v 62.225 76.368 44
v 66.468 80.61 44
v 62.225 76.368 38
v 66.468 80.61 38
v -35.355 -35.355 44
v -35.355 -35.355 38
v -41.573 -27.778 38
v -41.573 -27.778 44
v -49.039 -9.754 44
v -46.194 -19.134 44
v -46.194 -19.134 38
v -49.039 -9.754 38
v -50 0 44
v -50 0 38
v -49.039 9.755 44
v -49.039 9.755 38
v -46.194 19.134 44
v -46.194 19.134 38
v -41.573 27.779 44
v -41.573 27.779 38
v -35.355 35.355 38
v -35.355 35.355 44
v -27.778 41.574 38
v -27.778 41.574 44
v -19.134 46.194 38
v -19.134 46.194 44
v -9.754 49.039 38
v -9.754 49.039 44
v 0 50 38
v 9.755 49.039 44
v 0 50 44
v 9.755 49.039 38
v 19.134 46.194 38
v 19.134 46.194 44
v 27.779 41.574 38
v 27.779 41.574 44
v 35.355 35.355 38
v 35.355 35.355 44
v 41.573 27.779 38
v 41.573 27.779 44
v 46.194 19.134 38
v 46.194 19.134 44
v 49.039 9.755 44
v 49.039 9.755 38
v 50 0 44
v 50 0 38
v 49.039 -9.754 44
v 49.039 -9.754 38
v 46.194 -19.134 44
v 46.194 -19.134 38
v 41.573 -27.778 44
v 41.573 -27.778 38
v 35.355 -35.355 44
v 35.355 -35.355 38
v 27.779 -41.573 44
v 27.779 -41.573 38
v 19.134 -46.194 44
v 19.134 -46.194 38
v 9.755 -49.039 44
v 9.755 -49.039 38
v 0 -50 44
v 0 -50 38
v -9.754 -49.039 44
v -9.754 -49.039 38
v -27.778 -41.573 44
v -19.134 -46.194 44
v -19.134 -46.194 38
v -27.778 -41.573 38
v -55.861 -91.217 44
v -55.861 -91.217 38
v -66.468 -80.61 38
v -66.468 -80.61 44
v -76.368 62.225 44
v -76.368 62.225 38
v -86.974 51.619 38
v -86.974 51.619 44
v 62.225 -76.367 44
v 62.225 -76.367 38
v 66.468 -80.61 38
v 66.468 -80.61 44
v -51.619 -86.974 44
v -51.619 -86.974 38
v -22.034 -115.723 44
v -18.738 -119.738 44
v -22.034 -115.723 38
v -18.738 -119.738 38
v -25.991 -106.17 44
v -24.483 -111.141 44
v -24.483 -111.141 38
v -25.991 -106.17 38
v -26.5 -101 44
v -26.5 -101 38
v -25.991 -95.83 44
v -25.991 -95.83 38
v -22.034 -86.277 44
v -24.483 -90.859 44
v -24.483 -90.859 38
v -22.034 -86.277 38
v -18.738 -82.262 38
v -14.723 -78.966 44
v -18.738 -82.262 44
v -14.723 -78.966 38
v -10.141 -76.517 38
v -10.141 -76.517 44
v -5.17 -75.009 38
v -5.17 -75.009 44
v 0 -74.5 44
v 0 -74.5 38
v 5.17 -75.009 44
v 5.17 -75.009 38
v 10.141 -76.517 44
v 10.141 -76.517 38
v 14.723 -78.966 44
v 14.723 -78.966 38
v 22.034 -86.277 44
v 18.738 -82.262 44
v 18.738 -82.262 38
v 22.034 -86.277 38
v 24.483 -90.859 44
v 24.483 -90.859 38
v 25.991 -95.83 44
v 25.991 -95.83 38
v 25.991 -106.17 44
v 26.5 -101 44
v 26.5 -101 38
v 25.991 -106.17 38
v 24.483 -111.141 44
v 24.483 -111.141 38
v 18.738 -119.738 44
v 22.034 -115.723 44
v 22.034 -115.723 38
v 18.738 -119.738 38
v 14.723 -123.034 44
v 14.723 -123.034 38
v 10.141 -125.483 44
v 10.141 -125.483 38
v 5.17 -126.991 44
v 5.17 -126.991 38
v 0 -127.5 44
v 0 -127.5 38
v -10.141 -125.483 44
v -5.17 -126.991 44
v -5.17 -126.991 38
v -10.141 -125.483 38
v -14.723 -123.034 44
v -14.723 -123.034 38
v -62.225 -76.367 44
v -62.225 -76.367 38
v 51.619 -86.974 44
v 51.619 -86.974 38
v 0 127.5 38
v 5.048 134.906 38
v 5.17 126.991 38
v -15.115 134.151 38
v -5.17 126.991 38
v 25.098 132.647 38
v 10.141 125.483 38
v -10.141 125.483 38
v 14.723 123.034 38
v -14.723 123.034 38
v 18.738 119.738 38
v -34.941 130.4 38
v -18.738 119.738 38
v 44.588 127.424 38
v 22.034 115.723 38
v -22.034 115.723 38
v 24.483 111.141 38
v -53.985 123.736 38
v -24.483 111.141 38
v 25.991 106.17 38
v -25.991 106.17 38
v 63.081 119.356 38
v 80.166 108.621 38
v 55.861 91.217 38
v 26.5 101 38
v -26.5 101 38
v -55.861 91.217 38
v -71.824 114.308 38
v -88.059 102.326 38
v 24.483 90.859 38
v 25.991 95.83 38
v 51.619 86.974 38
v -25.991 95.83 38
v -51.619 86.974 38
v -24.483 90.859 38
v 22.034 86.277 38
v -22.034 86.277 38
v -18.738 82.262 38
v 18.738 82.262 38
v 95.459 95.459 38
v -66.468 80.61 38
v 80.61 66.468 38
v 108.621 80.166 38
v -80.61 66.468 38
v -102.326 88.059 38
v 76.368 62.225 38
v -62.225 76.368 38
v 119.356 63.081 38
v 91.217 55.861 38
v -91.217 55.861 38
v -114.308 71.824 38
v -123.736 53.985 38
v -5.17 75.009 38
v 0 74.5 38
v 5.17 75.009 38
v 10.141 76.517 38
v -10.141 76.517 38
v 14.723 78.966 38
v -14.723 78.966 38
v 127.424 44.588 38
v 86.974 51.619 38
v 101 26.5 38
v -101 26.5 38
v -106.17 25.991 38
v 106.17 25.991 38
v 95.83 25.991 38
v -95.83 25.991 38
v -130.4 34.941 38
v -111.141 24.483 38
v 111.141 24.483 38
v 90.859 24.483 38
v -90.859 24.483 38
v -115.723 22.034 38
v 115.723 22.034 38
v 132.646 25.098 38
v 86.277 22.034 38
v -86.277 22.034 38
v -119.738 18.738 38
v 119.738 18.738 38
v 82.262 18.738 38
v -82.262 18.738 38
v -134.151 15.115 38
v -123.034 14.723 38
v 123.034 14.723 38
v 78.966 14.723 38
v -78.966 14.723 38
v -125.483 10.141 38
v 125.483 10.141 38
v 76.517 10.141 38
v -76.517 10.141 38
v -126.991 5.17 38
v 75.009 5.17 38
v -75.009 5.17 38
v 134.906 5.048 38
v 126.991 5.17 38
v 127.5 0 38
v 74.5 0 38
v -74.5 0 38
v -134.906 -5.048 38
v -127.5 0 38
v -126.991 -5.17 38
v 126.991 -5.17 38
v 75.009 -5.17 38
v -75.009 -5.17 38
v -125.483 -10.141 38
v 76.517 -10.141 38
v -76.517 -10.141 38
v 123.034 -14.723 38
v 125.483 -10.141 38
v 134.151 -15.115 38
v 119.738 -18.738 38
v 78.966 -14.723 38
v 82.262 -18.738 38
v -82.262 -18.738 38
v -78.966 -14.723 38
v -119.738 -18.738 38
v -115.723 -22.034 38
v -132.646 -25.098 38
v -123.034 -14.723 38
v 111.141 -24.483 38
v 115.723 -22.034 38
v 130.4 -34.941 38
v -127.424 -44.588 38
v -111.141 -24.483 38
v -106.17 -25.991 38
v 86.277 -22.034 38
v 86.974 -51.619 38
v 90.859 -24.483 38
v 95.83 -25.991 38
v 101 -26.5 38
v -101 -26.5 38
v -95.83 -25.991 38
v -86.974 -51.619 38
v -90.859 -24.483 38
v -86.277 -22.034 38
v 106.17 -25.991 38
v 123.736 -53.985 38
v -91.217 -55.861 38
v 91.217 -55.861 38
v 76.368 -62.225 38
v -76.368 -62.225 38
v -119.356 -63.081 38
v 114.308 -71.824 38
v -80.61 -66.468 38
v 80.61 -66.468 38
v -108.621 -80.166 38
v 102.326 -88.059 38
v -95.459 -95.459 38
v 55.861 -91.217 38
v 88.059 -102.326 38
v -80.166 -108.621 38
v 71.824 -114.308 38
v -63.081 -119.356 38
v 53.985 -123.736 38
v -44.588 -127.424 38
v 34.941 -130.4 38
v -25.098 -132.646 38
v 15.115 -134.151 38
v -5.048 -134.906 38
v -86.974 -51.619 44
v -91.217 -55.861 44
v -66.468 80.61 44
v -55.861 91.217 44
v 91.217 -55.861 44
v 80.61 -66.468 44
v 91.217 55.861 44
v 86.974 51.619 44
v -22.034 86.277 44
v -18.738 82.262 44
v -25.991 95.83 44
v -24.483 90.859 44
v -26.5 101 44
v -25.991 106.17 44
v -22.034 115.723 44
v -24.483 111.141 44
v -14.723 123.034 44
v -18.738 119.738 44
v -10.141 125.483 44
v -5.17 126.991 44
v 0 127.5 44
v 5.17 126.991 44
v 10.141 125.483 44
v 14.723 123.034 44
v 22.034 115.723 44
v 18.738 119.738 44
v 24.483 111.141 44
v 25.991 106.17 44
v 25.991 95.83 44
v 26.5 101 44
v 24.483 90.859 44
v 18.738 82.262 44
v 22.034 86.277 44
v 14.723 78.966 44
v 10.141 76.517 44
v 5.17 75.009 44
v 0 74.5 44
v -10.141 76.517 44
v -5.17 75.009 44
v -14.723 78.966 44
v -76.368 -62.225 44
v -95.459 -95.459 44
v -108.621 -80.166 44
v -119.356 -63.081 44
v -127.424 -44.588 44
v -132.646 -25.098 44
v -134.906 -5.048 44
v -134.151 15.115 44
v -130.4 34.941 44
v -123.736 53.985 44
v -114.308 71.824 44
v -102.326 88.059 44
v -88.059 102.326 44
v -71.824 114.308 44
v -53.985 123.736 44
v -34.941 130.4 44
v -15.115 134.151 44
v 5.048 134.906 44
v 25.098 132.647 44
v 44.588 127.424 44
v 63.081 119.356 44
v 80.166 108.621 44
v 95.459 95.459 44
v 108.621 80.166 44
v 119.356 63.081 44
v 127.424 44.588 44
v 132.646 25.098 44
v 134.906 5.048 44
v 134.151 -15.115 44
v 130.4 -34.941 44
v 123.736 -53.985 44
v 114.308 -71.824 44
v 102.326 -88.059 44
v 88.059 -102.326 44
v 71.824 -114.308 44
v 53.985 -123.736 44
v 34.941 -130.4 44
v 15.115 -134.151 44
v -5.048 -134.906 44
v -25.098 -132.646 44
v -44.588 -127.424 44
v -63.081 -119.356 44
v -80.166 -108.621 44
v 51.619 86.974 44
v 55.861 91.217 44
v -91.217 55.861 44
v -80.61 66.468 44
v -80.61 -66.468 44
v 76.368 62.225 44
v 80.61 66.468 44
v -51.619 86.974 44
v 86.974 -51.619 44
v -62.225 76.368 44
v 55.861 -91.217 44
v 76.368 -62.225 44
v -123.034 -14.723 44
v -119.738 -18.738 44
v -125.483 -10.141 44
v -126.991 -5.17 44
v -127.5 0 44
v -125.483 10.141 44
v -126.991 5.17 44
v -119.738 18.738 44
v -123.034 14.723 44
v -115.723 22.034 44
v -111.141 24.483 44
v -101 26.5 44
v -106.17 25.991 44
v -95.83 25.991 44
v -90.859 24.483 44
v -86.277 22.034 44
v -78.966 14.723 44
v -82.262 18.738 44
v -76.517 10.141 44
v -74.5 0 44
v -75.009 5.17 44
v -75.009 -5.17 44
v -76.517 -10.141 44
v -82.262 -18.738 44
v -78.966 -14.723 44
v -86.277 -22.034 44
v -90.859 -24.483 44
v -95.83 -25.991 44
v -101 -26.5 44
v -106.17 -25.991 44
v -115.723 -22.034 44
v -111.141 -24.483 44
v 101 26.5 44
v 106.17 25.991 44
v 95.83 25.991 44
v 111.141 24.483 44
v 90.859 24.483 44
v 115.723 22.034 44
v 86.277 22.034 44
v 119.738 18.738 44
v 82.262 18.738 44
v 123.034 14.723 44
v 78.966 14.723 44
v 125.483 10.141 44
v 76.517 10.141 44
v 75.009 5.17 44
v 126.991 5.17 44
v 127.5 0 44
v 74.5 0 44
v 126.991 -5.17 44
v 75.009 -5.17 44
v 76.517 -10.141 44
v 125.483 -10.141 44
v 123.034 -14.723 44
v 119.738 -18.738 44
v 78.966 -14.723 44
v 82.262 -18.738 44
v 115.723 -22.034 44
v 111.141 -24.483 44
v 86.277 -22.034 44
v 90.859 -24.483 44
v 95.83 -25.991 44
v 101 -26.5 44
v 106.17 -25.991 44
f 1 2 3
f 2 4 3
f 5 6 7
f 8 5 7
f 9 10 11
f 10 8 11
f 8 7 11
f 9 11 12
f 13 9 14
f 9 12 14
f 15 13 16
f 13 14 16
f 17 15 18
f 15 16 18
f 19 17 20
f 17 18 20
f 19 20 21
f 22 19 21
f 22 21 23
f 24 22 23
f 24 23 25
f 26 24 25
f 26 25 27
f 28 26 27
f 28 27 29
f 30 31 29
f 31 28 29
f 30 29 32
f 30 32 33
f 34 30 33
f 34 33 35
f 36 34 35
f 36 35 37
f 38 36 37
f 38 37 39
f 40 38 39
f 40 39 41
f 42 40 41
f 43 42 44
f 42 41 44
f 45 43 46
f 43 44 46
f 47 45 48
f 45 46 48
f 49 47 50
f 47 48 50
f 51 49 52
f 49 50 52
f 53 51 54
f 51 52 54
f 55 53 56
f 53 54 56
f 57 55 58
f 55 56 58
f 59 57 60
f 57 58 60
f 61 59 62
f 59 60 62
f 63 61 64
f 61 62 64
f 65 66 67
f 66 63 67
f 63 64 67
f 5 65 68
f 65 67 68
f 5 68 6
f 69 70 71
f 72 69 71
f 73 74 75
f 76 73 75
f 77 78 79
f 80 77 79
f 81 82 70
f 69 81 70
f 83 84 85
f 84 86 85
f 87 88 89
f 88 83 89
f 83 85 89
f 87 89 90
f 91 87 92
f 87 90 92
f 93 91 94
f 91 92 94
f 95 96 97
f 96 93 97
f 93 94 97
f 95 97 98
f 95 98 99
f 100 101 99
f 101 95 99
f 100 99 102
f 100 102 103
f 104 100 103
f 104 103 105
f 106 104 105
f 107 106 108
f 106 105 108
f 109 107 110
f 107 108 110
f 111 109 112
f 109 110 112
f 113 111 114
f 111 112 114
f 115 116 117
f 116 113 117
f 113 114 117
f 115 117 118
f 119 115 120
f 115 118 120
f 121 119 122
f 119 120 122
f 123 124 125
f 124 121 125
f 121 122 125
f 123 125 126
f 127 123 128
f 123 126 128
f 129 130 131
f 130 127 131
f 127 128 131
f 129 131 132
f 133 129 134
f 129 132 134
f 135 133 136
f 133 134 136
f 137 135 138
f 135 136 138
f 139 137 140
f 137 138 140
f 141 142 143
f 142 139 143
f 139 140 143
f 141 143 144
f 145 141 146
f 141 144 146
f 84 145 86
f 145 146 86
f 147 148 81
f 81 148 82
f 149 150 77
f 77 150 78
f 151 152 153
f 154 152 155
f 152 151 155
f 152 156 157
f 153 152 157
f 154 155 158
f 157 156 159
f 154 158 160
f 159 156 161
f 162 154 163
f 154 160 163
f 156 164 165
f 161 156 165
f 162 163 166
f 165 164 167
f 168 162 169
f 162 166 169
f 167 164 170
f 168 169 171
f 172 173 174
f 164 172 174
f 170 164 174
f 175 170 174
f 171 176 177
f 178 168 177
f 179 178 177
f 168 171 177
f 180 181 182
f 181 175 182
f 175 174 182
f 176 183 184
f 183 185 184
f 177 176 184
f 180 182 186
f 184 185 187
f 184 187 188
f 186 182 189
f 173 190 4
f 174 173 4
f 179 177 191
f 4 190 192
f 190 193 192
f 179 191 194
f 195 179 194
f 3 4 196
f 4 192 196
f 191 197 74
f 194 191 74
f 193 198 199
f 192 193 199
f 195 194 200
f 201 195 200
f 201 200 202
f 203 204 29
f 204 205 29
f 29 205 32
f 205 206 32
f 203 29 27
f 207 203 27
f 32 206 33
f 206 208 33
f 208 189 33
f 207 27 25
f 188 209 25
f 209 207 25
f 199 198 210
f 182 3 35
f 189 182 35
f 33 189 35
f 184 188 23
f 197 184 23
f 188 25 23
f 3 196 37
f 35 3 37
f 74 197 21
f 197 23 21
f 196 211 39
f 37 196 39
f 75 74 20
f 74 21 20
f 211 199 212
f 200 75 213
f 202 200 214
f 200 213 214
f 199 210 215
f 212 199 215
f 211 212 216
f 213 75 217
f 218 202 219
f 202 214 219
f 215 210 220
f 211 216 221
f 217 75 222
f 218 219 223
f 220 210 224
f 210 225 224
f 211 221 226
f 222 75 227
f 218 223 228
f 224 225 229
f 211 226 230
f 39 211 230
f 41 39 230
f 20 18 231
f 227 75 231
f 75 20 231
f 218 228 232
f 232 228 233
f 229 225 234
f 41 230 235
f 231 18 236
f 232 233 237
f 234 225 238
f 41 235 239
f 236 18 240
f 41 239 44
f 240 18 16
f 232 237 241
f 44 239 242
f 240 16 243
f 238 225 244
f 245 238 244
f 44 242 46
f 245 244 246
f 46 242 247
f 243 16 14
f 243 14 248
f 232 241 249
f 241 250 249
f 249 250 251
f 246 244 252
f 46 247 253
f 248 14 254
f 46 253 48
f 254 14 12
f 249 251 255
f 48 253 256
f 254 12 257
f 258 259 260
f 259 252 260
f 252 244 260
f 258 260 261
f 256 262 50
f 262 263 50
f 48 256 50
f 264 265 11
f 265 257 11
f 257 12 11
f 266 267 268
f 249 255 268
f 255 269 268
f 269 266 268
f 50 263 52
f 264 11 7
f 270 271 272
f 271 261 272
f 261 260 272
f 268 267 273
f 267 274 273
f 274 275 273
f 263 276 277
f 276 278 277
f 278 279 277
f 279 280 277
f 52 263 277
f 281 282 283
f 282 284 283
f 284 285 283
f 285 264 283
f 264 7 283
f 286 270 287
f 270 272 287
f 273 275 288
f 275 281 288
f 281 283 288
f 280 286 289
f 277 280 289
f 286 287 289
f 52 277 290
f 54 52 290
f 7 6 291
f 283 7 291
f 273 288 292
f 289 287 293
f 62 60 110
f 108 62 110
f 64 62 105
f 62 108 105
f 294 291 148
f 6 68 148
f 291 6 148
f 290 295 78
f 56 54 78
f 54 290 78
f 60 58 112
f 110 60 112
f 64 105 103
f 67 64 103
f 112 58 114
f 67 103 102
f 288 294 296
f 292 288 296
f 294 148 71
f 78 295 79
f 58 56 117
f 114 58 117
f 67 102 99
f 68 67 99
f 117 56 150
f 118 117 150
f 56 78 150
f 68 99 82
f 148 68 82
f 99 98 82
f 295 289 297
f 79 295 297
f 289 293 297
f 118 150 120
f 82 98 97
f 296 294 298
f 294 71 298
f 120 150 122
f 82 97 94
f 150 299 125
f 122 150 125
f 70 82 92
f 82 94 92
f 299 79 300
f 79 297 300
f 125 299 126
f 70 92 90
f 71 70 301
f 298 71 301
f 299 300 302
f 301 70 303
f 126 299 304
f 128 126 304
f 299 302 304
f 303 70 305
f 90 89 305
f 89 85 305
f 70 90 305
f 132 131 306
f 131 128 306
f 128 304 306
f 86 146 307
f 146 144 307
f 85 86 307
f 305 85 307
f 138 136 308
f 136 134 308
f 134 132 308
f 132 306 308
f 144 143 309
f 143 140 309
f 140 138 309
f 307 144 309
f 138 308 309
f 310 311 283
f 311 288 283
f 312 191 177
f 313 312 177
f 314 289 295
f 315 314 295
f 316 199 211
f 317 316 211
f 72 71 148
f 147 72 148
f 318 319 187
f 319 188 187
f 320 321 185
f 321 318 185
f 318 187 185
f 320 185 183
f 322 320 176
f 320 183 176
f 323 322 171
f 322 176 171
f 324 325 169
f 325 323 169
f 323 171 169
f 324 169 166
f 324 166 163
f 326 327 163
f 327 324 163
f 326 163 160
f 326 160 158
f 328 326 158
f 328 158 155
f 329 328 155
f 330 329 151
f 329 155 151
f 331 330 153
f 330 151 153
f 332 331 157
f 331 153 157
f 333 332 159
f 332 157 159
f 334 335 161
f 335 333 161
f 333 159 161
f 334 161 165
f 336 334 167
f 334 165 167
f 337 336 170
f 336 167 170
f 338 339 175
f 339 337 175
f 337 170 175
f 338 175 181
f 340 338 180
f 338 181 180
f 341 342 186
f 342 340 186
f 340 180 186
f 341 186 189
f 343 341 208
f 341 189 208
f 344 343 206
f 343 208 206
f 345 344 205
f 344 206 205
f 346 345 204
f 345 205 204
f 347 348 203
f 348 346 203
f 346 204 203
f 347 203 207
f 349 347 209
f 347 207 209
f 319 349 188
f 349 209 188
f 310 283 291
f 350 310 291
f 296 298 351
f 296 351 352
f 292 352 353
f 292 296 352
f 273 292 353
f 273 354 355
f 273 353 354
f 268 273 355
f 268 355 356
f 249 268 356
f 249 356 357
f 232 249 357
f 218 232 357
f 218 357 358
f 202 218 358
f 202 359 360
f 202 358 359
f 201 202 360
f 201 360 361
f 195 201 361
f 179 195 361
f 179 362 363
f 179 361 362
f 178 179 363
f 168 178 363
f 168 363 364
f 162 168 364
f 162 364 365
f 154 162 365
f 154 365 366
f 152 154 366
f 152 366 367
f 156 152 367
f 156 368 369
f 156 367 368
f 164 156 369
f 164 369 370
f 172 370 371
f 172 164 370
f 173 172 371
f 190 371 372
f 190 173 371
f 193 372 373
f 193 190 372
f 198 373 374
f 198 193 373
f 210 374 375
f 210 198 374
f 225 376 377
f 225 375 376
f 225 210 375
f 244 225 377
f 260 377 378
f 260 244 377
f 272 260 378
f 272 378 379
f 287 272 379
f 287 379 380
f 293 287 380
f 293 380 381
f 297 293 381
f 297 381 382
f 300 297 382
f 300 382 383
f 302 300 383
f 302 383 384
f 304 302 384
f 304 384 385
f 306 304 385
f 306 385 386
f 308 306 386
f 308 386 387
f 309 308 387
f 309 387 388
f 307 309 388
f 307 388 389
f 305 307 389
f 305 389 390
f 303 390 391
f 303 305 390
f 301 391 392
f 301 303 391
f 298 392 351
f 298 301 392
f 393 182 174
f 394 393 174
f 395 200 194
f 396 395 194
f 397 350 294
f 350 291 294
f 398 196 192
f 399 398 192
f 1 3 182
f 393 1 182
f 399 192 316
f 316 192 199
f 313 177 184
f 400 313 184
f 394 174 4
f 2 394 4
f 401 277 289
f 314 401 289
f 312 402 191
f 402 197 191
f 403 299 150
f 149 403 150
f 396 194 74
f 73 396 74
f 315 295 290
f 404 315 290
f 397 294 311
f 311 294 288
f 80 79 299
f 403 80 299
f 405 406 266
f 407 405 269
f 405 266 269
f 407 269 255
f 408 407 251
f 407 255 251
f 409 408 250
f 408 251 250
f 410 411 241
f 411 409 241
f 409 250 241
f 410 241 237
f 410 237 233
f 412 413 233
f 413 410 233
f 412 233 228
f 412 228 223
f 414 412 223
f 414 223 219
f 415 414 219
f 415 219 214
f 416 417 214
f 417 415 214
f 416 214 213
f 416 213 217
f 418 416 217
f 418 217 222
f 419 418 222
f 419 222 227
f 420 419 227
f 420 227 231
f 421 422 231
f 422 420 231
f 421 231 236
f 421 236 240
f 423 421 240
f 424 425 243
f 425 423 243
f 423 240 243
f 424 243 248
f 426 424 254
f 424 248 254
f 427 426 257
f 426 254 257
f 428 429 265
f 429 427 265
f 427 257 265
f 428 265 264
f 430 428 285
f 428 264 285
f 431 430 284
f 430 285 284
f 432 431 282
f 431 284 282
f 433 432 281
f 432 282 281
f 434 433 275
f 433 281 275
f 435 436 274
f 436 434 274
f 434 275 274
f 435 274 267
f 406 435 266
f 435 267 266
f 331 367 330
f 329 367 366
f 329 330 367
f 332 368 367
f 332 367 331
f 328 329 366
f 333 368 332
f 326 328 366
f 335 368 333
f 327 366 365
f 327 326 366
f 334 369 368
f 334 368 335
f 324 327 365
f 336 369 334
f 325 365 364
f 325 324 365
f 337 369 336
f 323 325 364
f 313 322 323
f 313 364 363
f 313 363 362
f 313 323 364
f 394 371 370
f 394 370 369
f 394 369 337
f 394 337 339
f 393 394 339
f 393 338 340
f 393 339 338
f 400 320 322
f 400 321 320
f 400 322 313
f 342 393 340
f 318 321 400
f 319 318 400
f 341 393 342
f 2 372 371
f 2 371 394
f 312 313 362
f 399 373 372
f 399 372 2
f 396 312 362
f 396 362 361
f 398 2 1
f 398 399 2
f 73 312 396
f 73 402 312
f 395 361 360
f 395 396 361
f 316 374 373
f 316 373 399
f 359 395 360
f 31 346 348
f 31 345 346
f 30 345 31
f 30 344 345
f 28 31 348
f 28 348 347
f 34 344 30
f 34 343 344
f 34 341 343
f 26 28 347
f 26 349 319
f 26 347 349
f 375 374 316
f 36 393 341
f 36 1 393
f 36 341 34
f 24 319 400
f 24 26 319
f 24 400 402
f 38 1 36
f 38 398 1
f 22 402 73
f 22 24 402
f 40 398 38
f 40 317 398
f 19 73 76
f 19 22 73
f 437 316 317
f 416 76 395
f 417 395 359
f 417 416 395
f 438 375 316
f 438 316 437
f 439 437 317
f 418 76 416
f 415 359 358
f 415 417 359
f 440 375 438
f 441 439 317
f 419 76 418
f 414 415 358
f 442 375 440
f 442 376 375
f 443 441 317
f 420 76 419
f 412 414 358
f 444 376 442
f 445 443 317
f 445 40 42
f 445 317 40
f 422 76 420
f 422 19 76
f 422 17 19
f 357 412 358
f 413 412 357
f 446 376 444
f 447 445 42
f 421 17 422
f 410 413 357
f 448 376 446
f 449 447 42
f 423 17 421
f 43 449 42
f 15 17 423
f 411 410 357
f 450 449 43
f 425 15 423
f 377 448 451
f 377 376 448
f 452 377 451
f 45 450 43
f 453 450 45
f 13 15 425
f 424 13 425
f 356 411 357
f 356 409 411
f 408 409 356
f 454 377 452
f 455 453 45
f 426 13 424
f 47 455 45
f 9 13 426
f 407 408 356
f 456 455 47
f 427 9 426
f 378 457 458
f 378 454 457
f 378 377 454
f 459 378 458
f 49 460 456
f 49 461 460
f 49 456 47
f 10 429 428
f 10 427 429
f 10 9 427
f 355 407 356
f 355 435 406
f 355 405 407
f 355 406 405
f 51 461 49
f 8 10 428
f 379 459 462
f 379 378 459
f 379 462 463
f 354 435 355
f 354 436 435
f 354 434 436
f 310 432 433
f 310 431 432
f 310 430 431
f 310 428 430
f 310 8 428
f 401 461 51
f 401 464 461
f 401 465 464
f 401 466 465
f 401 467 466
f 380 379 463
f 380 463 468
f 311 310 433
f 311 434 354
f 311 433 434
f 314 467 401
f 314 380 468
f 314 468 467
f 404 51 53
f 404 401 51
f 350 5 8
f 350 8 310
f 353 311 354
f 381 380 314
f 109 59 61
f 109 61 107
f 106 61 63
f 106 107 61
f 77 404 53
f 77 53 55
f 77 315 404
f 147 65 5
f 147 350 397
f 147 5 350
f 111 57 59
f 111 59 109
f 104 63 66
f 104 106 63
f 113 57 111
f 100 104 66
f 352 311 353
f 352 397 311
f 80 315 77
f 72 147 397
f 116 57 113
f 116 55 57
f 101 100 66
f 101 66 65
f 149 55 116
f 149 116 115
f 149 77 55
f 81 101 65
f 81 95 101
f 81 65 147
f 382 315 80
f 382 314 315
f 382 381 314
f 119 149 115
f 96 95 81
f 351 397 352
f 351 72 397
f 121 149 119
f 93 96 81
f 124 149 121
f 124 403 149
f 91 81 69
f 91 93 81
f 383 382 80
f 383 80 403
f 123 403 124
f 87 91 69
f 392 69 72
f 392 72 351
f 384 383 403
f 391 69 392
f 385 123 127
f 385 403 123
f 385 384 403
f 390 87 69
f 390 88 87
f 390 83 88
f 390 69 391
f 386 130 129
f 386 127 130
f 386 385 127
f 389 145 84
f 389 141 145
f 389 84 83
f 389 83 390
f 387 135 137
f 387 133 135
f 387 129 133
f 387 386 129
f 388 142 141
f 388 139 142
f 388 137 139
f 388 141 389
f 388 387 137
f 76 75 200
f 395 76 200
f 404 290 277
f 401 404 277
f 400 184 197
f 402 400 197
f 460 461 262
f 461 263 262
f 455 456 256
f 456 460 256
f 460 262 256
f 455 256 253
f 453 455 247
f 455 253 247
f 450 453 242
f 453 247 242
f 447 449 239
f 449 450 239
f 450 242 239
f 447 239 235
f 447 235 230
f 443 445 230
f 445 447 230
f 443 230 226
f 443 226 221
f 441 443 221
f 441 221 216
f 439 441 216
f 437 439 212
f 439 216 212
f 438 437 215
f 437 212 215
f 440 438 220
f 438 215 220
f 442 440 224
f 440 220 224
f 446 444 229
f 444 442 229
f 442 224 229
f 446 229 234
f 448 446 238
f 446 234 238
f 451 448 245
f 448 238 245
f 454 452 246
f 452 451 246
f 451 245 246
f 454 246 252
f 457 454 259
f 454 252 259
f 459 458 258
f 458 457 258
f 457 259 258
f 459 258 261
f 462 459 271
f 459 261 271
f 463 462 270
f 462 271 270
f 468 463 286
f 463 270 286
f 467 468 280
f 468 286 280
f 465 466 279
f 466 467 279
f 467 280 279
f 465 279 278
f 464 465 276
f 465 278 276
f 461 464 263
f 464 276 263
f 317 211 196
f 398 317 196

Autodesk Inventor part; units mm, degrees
ref_plane "YZ Plane" through (0, 0, 0) normal (1, 0, 0) x (0, 1, 0)
ref_plane "XZ Plane" through (0, 0, 0) normal (0, 1, 0) x (-1, 0, 0)
ref_plane "XY Plane" through (0, 0, 0) normal (0, 0, 1) x (1, 0, 0)
ref_plane "РабПлоскость1" through (-64.3467, 78.4889, 38) normal (0, 0, 1) x (-0.7071, -0.7071, 0)
sketch "Эскиз1" plane through (-64.3467, 78.4889, 38) normal (0, 0, 1) x (-0.7071, -0.7071, 0)
  circle A0 centre (10, 101) radius 135 projected
  line L0 (35, 205) -> (35, 199) projected
  line L1 (35, 199) -> (20, 199) projected
  line L2 (20, 199) -> (20, 205) projected
  line L3 (20, 205) -> (35, 205) projected
  line L4 (-15, 205) -> (0, 205) projected
  line L5 (0, 205) -> (0, 199) projected
  line L6 (0, 199) -> (-15, 199) projected
  line L7 (-15, 199) -> (-15, 205) projected
  line L8 (114, 76) -> (108, 76) projected
  line L9 (108, 76) -> (108, 91) projected
  line L10 (108, 91) -> (114, 91) projected
  line L11 (114, 91) -> (114, 76) projected
  line L12 (114, 126) -> (114, 111) projected
  line L13 (114, 111) -> (108, 111) projected
  line L14 (108, 111) -> (108, 126) projected
  line L15 (108, 126) -> (114, 126) projected
  line L16 (-15, -3) -> (-15, 3) projected
  line L17 (-15, 3) -> (0, 3) projected
  line L18 (0, 3) -> (0, -3) projected
  line L19 (0, -3) -> (-15, -3) projected
  line L20 (35, -3) -> (20, -3) projected
  line L21 (20, -3) -> (20, 3) projected
  line L22 (20, 3) -> (35, 3) projected
  line L23 (35, 3) -> (35, -3) projected
  line L24 (-88, 111) -> (-94, 111) projected
  line L25 (-94, 111) -> (-94, 126) projected
  line L26 (-94, 126) -> (-88, 126) projected
  line L27 (-88, 126) -> (-88, 111) projected
  line L28 (-94, 91) -> (-88, 91) projected
  line L29 (-88, 91) -> (-88, 76) projected
  line L30 (-88, 76) -> (-94, 76) projected
  line L31 (-94, 76) -> (-94, 91) projected
  circle A1 centre (10, 101) radius 50 projected
  circle A2 centre (10, 101) radius 135 projected
  circle A3 centre (81.4178, 29.5822) radius 26.5 projected
  circle A4 centre (-61.4178, 29.5822) radius 26.5 projected
  circle A5 centre (-61.4178, 172.4178) radius 26.5 projected
  circle A6 centre (81.4178, 172.4178) radius 26.5 projected
  point P0 (10, 101)
extrude "Выдавливание1" add sketch "Эскиз1" along normal blind 6
properties part number "Диск_верхний_В5" material "По умолчанию1"
